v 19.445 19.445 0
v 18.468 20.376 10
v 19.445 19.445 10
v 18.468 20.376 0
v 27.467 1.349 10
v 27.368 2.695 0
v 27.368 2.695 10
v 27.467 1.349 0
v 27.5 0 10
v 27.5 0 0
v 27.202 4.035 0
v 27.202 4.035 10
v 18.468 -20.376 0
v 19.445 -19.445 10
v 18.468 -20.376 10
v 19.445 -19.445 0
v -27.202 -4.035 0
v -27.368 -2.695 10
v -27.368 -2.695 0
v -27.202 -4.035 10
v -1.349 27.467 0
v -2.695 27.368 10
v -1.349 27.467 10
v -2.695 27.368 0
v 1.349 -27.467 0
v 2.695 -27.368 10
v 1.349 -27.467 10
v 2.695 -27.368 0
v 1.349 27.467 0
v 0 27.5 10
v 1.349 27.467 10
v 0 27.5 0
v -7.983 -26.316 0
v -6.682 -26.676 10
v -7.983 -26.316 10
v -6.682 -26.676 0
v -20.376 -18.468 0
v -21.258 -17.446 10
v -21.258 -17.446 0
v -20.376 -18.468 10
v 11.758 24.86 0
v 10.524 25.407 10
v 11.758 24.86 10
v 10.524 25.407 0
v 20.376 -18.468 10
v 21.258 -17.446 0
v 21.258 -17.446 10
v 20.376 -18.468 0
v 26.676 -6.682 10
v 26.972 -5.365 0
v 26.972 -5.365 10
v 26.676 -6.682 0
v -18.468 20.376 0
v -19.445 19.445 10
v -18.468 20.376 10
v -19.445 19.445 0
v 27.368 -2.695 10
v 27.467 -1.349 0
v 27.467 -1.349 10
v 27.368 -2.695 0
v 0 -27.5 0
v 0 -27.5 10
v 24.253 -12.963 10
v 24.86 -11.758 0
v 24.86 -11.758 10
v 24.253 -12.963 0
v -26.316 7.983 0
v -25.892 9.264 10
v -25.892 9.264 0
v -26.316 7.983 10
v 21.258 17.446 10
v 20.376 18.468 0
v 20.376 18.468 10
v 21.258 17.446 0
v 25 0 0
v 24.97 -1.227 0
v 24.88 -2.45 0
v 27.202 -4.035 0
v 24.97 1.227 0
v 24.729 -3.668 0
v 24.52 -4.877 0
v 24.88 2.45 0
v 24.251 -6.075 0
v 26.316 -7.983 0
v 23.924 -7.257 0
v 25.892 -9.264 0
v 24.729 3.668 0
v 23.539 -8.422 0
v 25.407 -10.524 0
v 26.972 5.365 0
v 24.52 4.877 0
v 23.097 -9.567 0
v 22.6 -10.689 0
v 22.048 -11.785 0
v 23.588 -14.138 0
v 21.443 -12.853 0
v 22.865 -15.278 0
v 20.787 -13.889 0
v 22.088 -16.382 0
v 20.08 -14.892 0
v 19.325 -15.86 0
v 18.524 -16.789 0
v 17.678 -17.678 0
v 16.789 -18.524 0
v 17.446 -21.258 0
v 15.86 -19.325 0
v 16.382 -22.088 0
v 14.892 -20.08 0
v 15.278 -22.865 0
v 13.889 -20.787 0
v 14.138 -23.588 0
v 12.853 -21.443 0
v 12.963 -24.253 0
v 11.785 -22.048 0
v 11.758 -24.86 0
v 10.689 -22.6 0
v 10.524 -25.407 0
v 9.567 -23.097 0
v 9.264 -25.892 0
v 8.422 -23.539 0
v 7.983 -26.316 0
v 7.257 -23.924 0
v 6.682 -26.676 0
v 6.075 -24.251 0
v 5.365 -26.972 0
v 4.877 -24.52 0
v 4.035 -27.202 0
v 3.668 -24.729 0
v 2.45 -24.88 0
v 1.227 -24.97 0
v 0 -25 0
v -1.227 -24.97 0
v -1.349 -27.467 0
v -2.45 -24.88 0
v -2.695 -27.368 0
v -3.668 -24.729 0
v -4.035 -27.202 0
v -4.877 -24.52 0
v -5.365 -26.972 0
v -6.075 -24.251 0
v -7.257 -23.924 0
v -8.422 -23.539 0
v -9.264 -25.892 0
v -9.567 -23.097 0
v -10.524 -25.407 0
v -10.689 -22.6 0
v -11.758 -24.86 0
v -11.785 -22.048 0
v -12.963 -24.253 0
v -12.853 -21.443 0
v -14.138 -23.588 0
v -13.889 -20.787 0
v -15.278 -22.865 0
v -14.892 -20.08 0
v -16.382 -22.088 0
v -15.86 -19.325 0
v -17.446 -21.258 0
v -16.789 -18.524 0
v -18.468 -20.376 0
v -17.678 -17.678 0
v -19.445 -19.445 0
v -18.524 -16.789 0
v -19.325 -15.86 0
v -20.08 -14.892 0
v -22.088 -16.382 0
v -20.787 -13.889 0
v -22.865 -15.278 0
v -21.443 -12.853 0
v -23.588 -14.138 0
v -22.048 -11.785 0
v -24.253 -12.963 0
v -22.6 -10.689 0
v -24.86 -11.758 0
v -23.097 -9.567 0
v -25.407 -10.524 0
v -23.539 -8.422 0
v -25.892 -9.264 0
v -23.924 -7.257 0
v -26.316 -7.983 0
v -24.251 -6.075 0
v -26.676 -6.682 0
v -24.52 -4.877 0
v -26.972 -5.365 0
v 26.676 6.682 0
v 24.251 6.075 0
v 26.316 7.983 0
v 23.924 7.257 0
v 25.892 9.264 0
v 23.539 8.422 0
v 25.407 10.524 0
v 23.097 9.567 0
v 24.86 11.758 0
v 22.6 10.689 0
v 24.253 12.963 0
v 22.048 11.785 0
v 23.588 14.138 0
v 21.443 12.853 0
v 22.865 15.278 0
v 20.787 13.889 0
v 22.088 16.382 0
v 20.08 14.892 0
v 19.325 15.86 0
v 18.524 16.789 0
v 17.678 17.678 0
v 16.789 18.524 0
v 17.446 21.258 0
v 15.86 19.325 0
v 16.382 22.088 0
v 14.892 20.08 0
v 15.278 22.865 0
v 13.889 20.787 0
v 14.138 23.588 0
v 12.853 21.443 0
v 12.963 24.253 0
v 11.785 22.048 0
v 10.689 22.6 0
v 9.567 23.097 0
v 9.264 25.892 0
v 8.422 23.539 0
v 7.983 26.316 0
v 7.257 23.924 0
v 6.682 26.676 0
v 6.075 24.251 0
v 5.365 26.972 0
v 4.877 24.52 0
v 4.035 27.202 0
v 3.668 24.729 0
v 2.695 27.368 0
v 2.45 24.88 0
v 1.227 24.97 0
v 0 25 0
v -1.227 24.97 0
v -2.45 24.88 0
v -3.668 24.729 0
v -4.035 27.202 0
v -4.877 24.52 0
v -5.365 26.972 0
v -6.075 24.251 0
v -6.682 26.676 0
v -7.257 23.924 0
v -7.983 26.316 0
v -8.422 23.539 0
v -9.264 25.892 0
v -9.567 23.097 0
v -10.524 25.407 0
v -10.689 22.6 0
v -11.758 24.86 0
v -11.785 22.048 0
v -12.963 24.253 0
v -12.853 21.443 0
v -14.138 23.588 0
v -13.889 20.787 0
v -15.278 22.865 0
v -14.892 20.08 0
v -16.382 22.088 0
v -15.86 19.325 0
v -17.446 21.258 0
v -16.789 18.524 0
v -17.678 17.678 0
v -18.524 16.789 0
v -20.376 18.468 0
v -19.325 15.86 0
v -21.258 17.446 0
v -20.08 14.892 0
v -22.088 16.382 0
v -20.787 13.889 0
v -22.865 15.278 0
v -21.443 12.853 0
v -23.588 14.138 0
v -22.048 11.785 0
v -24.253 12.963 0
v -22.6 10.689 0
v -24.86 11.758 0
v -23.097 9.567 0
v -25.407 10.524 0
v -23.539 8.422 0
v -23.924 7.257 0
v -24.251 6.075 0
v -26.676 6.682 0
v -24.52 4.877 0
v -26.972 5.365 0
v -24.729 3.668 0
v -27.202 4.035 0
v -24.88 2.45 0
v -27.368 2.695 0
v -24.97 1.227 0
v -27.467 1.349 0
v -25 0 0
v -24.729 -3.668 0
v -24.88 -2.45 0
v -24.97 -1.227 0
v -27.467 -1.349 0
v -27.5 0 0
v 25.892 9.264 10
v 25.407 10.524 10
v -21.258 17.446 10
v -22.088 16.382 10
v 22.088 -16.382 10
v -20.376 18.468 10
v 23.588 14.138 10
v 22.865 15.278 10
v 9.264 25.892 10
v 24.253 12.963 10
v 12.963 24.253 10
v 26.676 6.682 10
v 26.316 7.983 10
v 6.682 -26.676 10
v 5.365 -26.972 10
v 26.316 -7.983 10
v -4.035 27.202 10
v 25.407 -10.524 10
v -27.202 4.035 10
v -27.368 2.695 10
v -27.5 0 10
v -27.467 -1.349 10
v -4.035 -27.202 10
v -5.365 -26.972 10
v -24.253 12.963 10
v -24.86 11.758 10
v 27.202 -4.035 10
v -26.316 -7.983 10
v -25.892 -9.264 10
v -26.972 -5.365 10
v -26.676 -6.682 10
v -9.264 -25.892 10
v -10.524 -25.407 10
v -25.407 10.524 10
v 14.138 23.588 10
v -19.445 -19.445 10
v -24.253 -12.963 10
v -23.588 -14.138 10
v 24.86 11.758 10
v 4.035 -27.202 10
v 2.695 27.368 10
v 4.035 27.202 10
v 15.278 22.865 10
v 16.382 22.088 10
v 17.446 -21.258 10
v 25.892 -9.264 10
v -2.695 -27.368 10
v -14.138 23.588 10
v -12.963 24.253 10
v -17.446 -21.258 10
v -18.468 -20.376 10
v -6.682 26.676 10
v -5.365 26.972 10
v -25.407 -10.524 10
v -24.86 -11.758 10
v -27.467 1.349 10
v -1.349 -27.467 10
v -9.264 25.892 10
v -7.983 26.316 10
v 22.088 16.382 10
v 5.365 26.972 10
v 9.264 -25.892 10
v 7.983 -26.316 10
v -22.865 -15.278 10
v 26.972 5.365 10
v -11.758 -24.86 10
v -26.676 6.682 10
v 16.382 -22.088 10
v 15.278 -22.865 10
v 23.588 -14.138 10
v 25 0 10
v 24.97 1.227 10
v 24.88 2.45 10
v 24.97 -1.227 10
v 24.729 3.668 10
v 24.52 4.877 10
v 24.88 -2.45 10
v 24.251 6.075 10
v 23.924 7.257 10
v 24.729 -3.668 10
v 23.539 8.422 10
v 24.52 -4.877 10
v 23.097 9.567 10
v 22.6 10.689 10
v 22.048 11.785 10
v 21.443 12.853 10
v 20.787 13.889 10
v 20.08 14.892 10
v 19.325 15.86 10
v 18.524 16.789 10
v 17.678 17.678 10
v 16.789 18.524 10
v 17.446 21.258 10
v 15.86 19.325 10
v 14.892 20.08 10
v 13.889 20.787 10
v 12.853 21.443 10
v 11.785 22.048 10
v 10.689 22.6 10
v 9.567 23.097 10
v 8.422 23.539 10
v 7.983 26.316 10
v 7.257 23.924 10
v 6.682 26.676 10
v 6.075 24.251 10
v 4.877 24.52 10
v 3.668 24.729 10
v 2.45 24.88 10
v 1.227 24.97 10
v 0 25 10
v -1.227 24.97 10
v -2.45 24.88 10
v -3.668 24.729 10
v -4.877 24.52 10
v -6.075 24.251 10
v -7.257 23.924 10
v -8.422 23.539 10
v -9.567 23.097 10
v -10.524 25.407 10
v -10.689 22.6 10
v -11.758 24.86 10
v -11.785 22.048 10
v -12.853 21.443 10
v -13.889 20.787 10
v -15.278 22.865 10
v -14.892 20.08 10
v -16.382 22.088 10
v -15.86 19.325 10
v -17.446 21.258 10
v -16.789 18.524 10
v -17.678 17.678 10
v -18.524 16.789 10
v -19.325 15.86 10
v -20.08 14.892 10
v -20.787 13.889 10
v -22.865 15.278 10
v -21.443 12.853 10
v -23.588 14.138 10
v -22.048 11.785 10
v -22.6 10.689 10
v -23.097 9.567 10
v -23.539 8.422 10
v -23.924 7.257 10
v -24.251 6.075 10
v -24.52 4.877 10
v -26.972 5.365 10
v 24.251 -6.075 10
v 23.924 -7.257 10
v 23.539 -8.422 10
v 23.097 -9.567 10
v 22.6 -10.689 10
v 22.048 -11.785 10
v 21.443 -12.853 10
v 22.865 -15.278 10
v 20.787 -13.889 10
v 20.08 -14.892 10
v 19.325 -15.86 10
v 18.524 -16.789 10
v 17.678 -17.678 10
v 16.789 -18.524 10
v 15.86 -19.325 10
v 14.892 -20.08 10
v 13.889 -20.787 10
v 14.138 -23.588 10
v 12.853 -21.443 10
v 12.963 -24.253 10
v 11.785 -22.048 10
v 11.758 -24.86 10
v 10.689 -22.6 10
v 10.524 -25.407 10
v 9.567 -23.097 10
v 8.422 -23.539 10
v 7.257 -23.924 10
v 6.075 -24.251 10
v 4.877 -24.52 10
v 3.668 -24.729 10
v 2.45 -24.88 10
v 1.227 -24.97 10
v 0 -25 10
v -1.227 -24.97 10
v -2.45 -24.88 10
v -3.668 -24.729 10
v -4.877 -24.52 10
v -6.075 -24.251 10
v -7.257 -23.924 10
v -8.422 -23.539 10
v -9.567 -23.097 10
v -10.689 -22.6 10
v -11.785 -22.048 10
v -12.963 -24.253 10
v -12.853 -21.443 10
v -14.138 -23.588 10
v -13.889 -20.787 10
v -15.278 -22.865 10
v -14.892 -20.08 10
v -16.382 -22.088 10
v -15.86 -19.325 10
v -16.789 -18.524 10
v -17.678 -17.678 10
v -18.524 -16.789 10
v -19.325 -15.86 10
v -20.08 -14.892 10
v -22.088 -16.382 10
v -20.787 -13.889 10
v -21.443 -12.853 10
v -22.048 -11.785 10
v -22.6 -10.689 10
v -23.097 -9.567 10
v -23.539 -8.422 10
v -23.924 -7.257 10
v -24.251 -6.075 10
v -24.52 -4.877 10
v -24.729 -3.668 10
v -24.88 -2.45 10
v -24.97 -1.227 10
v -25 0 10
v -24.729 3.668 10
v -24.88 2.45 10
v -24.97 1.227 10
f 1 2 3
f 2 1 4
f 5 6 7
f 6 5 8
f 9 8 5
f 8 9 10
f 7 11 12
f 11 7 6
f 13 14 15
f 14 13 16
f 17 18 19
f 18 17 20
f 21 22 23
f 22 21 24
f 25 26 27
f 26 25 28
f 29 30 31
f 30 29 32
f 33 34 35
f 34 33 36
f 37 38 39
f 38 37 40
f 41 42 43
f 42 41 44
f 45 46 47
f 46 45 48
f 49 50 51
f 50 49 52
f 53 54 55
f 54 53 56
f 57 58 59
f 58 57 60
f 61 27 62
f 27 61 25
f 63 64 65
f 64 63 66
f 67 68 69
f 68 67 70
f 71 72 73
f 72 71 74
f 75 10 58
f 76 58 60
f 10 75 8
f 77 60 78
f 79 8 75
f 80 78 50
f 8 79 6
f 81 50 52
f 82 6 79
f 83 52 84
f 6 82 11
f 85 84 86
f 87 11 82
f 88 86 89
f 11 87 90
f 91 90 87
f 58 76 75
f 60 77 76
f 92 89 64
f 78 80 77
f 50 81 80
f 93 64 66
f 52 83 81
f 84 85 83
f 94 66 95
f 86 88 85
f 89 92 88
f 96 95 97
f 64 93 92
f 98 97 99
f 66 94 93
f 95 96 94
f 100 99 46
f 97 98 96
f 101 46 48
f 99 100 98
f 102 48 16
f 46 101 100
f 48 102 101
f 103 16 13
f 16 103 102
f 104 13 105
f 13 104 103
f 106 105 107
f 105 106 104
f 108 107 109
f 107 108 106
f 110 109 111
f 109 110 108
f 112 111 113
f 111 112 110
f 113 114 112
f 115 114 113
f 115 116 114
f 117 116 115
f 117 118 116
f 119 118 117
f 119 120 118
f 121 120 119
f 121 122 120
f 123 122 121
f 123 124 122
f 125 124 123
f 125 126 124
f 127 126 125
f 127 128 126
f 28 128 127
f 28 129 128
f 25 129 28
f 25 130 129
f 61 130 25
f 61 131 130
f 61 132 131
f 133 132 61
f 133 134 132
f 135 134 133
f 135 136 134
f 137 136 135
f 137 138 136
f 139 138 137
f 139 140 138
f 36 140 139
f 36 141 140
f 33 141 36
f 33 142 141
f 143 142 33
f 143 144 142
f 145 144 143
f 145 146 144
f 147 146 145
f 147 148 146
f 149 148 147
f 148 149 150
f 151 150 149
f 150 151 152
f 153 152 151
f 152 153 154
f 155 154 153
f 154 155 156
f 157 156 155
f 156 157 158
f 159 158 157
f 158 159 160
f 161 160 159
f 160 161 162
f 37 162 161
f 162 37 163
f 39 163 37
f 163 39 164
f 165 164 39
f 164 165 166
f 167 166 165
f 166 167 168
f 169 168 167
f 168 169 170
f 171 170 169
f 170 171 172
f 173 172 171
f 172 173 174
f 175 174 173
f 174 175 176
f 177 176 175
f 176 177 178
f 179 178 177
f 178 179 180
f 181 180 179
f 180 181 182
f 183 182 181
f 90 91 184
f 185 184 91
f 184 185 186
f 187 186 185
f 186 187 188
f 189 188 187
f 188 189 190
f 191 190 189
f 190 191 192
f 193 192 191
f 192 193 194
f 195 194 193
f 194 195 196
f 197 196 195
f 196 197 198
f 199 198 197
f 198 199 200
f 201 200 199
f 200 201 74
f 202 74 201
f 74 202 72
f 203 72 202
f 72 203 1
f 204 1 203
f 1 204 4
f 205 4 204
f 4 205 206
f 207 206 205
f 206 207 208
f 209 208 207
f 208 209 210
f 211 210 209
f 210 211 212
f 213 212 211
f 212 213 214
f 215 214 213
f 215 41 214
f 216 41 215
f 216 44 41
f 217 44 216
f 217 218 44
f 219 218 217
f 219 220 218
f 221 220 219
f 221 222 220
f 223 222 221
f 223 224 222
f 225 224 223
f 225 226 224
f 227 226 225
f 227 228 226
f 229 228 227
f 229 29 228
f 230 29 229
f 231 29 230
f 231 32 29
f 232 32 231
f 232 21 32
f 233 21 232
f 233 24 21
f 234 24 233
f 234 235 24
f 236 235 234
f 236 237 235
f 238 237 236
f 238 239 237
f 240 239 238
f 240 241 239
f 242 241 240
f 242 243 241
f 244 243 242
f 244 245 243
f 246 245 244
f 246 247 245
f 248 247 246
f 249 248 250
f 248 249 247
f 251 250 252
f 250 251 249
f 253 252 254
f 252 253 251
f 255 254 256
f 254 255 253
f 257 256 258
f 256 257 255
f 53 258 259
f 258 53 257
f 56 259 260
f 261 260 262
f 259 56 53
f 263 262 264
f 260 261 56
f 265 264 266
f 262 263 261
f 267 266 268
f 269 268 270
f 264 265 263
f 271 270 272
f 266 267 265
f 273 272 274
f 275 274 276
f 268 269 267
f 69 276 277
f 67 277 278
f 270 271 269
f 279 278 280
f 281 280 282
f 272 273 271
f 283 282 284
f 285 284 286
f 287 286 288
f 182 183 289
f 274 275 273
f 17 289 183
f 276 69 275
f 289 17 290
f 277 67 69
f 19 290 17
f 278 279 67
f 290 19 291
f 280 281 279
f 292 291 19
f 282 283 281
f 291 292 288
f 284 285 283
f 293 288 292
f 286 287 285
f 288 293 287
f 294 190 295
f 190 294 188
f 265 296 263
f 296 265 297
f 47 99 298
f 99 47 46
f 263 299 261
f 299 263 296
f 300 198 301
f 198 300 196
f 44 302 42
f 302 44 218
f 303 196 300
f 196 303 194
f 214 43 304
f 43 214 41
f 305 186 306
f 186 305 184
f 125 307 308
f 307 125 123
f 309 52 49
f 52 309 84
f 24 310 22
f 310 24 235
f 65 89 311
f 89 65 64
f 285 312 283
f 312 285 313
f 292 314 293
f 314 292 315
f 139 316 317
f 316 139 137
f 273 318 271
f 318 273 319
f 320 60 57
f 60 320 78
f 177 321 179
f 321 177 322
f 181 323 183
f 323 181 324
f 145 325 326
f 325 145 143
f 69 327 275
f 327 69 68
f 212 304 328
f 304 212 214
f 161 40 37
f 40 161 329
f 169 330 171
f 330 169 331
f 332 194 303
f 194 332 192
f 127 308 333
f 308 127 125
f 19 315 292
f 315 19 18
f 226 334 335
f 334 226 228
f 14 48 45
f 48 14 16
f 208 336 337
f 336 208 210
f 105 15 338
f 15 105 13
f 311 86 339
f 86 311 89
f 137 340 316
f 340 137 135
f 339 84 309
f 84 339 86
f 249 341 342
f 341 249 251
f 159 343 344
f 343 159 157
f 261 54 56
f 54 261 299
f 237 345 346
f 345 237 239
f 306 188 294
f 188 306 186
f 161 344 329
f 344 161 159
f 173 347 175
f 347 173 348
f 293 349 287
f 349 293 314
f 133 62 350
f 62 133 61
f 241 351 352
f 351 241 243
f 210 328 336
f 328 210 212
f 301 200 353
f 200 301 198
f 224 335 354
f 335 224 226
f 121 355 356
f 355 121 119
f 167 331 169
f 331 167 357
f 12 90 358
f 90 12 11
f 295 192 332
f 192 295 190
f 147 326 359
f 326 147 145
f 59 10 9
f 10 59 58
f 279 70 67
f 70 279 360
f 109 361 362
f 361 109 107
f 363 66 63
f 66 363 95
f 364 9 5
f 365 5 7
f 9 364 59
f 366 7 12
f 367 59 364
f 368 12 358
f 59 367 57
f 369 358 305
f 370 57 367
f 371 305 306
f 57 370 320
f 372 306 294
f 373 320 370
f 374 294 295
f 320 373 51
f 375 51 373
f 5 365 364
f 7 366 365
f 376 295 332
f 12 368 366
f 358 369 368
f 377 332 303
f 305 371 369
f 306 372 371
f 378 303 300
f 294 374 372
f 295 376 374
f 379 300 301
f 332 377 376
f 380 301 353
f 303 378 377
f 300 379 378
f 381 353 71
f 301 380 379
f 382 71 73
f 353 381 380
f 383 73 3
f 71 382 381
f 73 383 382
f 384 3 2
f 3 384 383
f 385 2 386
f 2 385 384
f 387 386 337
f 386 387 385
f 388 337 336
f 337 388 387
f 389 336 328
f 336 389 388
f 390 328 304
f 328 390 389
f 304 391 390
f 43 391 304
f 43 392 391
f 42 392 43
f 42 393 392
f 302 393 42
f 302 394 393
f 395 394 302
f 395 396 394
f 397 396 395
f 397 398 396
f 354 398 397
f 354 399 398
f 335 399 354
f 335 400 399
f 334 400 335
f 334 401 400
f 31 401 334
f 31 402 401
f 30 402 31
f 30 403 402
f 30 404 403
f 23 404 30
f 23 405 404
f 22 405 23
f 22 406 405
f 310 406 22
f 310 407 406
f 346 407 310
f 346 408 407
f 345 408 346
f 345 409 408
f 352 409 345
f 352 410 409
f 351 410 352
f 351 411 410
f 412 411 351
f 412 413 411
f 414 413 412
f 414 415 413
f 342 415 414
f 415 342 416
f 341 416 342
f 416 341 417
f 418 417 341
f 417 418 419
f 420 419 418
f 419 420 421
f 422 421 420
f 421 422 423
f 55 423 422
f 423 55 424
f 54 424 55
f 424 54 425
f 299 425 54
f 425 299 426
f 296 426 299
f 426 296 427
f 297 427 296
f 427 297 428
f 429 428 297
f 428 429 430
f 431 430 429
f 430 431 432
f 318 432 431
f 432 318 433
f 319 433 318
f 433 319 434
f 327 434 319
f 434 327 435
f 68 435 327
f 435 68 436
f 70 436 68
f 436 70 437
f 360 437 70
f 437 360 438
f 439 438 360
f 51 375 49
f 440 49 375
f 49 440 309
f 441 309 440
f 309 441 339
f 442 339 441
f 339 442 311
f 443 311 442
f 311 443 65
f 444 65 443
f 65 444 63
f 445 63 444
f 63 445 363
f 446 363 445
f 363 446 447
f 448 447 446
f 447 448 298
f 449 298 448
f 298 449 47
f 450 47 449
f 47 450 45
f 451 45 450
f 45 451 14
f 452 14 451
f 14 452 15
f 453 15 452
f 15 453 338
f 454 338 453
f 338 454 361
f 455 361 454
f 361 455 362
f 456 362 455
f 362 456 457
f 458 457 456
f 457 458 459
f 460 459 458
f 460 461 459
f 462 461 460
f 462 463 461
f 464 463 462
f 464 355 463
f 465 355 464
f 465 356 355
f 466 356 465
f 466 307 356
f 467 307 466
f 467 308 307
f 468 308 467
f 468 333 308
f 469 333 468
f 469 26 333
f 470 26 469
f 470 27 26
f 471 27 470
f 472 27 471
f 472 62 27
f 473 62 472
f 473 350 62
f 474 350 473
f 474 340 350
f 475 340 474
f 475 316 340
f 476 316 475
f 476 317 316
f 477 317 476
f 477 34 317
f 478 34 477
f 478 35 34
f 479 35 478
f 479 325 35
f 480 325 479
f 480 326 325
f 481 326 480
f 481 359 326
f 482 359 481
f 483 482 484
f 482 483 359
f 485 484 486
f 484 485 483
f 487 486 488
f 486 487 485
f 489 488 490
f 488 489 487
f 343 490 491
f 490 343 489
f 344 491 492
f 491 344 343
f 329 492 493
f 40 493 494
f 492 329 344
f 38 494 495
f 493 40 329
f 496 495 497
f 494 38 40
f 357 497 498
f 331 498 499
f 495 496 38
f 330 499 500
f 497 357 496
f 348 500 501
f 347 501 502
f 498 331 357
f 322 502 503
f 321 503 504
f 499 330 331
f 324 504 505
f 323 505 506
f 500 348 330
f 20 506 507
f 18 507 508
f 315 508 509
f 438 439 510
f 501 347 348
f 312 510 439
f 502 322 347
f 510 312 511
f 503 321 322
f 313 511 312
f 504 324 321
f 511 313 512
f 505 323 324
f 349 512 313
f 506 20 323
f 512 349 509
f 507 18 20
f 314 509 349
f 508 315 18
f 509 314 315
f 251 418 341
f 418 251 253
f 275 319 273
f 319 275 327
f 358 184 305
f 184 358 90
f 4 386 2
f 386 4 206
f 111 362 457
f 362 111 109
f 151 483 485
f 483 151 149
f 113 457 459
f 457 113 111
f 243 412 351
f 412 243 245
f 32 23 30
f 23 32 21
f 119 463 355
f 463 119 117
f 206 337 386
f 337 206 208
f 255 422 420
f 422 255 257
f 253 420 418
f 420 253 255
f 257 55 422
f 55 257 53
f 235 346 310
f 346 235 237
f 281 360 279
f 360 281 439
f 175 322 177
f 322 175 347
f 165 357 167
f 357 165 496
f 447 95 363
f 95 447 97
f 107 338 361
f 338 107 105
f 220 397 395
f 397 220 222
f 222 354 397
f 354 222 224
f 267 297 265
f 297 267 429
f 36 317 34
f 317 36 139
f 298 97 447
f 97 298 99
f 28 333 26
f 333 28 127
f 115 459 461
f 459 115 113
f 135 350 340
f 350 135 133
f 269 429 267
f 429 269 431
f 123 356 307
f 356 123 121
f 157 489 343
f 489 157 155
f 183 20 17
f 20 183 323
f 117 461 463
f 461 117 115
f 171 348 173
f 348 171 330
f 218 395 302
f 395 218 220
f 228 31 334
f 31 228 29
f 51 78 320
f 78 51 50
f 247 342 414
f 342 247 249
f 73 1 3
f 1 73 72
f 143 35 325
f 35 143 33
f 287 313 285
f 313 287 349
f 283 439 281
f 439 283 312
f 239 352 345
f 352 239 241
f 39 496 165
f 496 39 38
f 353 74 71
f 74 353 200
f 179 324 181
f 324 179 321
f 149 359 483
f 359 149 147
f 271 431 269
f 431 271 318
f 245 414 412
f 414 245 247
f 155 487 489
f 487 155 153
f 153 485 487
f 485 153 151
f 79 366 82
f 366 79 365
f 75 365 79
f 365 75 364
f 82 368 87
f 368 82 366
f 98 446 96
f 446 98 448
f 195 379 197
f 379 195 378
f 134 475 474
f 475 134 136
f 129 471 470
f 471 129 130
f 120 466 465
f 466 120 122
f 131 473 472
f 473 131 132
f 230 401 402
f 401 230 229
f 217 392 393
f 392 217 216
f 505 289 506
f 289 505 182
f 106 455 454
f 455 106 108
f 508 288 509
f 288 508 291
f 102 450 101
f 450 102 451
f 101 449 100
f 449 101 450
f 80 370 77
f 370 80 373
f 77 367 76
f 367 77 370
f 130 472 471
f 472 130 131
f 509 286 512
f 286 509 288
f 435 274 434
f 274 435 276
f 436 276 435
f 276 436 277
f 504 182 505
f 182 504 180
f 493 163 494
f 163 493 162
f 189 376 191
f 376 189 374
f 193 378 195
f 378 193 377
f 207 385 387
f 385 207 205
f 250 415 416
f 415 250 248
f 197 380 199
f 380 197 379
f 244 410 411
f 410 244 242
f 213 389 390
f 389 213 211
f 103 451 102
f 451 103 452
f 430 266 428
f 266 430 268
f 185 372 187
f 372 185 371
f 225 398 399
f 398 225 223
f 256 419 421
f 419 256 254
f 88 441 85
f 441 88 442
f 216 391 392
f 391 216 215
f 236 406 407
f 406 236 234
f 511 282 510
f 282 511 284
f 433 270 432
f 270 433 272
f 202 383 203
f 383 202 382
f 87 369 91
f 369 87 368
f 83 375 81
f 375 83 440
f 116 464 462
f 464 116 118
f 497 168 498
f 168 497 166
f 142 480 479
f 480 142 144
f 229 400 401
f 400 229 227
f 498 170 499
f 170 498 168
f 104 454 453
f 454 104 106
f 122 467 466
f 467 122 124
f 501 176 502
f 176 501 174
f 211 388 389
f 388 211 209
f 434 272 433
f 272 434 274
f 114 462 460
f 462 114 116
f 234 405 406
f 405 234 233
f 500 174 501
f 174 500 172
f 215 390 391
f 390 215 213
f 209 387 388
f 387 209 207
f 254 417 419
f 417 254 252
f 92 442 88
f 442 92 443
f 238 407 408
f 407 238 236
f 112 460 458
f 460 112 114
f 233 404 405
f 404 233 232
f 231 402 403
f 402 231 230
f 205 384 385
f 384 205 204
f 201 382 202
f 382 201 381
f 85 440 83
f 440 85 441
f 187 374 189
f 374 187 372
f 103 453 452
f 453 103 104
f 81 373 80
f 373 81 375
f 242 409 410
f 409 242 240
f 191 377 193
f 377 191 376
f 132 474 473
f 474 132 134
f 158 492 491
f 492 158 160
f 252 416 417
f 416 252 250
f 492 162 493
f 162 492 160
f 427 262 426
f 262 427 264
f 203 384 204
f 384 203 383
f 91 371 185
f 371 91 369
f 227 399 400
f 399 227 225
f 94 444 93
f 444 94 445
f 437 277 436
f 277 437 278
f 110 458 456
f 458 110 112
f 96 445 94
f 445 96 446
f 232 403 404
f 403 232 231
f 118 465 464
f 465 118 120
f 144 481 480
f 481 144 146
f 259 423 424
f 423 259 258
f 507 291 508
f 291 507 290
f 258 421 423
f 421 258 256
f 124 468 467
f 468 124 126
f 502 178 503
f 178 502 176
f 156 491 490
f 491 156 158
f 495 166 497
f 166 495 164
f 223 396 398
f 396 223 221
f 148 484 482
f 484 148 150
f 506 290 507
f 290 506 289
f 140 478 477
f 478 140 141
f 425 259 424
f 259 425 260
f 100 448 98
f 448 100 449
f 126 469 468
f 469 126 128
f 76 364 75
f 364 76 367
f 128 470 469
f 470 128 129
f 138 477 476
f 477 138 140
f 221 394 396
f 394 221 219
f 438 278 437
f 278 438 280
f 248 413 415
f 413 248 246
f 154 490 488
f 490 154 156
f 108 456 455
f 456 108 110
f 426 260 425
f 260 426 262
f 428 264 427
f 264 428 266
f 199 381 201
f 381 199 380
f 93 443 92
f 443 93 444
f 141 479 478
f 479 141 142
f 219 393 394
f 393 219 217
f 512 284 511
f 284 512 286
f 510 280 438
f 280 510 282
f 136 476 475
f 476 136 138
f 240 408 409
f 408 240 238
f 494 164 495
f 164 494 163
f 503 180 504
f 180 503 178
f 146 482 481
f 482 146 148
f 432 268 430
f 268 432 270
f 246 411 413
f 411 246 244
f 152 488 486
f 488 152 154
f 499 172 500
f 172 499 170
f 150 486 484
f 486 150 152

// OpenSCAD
$fn = 128;
union() {
    difference() {
    //    cylinder(h=0.3, r=47.5);  
    //    cylinder(h=0.3, r=45);
    }
    difference() {
        cylinder(h=10, r=27.5);  
        cylinder(h=10, r=25);
    }
  
}
